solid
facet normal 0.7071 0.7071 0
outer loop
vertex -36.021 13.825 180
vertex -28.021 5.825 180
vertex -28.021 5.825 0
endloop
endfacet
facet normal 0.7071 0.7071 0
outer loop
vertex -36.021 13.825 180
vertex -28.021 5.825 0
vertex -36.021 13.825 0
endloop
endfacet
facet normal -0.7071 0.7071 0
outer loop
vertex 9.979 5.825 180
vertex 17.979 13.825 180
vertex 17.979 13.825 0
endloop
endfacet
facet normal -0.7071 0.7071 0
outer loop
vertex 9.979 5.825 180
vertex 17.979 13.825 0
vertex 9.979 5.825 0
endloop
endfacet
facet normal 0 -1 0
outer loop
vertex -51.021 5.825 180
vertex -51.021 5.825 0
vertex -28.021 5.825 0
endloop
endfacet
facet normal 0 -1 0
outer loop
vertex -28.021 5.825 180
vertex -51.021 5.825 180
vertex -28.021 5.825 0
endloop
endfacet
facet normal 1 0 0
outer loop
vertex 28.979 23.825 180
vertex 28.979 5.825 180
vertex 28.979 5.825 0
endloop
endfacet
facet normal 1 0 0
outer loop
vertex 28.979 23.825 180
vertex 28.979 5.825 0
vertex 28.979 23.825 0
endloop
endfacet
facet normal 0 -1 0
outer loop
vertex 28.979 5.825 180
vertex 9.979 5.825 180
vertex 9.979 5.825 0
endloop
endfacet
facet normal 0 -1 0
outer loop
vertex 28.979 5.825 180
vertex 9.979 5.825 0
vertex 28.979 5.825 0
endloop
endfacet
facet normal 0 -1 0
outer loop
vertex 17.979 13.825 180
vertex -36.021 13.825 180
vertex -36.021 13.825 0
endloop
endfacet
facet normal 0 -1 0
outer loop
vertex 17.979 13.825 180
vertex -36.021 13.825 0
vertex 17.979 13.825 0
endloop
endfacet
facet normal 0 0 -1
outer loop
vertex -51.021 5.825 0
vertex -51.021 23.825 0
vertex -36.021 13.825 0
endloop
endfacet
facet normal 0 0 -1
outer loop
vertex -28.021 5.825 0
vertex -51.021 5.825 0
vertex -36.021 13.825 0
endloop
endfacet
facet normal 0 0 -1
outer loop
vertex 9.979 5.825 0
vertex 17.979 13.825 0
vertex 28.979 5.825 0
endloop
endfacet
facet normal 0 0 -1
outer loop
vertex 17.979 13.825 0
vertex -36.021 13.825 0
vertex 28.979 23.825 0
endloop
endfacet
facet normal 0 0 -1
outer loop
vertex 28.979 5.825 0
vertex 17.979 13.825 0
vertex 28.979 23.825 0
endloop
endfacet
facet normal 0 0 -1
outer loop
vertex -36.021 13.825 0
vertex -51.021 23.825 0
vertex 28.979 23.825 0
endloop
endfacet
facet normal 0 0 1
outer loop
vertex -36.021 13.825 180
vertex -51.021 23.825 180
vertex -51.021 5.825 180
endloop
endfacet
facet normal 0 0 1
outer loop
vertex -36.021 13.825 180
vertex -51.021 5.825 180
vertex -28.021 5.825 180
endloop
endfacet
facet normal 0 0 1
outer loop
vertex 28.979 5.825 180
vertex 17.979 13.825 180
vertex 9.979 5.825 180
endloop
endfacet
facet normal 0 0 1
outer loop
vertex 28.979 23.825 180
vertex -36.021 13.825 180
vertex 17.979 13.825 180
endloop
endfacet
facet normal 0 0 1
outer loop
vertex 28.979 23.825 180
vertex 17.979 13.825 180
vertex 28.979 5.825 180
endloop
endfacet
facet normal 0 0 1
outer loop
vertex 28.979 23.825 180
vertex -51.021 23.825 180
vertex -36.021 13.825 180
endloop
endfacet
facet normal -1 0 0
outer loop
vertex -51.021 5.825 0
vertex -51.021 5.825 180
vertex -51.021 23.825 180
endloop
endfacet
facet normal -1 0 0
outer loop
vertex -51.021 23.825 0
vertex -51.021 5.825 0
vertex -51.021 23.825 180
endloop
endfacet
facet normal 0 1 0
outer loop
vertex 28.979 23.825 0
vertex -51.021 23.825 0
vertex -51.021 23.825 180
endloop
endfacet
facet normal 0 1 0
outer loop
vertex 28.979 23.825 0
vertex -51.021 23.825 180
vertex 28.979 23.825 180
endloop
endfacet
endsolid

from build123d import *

# Parameters (mm, degrees)
SKETCH1_W               = 80
SKETCH1_H               = 18
BOSS_EXTRUDE1_DEPTH     = 180
CUT_EXTRUDE1_DEPTH      = 1
CUT_EXTRUDE1_DEPTH_BACK = 180


with BuildPart() as part:
    # Sketch1 → Boss-Extrude1 (new body)
    with BuildSketch(Plane.XY):
        with Locations((-11.021069692, 14.824959481)):
            Rectangle(SKETCH1_W, SKETCH1_H)
    extrude(amount=BOSS_EXTRUDE1_DEPTH)

    # Sketch2 → Cut-Extrude1 (cut, two sides)
    with BuildSketch(Plane.XY.offset(180)) as cut_extrude1_sk:
        Polygon((-28.021069692, 5.824959481), (-36.021069692, 13.824959481), (17.978930308, 13.824959481), (9.978930308, 5.824959481), align=None)
    extrude(amount=CUT_EXTRUDE1_DEPTH, mode=Mode.SUBTRACT)
    extrude(cut_extrude1_sk.sketch, amount=-CUT_EXTRUDE1_DEPTH_BACK, mode=Mode.SUBTRACT)


solid = part.part
